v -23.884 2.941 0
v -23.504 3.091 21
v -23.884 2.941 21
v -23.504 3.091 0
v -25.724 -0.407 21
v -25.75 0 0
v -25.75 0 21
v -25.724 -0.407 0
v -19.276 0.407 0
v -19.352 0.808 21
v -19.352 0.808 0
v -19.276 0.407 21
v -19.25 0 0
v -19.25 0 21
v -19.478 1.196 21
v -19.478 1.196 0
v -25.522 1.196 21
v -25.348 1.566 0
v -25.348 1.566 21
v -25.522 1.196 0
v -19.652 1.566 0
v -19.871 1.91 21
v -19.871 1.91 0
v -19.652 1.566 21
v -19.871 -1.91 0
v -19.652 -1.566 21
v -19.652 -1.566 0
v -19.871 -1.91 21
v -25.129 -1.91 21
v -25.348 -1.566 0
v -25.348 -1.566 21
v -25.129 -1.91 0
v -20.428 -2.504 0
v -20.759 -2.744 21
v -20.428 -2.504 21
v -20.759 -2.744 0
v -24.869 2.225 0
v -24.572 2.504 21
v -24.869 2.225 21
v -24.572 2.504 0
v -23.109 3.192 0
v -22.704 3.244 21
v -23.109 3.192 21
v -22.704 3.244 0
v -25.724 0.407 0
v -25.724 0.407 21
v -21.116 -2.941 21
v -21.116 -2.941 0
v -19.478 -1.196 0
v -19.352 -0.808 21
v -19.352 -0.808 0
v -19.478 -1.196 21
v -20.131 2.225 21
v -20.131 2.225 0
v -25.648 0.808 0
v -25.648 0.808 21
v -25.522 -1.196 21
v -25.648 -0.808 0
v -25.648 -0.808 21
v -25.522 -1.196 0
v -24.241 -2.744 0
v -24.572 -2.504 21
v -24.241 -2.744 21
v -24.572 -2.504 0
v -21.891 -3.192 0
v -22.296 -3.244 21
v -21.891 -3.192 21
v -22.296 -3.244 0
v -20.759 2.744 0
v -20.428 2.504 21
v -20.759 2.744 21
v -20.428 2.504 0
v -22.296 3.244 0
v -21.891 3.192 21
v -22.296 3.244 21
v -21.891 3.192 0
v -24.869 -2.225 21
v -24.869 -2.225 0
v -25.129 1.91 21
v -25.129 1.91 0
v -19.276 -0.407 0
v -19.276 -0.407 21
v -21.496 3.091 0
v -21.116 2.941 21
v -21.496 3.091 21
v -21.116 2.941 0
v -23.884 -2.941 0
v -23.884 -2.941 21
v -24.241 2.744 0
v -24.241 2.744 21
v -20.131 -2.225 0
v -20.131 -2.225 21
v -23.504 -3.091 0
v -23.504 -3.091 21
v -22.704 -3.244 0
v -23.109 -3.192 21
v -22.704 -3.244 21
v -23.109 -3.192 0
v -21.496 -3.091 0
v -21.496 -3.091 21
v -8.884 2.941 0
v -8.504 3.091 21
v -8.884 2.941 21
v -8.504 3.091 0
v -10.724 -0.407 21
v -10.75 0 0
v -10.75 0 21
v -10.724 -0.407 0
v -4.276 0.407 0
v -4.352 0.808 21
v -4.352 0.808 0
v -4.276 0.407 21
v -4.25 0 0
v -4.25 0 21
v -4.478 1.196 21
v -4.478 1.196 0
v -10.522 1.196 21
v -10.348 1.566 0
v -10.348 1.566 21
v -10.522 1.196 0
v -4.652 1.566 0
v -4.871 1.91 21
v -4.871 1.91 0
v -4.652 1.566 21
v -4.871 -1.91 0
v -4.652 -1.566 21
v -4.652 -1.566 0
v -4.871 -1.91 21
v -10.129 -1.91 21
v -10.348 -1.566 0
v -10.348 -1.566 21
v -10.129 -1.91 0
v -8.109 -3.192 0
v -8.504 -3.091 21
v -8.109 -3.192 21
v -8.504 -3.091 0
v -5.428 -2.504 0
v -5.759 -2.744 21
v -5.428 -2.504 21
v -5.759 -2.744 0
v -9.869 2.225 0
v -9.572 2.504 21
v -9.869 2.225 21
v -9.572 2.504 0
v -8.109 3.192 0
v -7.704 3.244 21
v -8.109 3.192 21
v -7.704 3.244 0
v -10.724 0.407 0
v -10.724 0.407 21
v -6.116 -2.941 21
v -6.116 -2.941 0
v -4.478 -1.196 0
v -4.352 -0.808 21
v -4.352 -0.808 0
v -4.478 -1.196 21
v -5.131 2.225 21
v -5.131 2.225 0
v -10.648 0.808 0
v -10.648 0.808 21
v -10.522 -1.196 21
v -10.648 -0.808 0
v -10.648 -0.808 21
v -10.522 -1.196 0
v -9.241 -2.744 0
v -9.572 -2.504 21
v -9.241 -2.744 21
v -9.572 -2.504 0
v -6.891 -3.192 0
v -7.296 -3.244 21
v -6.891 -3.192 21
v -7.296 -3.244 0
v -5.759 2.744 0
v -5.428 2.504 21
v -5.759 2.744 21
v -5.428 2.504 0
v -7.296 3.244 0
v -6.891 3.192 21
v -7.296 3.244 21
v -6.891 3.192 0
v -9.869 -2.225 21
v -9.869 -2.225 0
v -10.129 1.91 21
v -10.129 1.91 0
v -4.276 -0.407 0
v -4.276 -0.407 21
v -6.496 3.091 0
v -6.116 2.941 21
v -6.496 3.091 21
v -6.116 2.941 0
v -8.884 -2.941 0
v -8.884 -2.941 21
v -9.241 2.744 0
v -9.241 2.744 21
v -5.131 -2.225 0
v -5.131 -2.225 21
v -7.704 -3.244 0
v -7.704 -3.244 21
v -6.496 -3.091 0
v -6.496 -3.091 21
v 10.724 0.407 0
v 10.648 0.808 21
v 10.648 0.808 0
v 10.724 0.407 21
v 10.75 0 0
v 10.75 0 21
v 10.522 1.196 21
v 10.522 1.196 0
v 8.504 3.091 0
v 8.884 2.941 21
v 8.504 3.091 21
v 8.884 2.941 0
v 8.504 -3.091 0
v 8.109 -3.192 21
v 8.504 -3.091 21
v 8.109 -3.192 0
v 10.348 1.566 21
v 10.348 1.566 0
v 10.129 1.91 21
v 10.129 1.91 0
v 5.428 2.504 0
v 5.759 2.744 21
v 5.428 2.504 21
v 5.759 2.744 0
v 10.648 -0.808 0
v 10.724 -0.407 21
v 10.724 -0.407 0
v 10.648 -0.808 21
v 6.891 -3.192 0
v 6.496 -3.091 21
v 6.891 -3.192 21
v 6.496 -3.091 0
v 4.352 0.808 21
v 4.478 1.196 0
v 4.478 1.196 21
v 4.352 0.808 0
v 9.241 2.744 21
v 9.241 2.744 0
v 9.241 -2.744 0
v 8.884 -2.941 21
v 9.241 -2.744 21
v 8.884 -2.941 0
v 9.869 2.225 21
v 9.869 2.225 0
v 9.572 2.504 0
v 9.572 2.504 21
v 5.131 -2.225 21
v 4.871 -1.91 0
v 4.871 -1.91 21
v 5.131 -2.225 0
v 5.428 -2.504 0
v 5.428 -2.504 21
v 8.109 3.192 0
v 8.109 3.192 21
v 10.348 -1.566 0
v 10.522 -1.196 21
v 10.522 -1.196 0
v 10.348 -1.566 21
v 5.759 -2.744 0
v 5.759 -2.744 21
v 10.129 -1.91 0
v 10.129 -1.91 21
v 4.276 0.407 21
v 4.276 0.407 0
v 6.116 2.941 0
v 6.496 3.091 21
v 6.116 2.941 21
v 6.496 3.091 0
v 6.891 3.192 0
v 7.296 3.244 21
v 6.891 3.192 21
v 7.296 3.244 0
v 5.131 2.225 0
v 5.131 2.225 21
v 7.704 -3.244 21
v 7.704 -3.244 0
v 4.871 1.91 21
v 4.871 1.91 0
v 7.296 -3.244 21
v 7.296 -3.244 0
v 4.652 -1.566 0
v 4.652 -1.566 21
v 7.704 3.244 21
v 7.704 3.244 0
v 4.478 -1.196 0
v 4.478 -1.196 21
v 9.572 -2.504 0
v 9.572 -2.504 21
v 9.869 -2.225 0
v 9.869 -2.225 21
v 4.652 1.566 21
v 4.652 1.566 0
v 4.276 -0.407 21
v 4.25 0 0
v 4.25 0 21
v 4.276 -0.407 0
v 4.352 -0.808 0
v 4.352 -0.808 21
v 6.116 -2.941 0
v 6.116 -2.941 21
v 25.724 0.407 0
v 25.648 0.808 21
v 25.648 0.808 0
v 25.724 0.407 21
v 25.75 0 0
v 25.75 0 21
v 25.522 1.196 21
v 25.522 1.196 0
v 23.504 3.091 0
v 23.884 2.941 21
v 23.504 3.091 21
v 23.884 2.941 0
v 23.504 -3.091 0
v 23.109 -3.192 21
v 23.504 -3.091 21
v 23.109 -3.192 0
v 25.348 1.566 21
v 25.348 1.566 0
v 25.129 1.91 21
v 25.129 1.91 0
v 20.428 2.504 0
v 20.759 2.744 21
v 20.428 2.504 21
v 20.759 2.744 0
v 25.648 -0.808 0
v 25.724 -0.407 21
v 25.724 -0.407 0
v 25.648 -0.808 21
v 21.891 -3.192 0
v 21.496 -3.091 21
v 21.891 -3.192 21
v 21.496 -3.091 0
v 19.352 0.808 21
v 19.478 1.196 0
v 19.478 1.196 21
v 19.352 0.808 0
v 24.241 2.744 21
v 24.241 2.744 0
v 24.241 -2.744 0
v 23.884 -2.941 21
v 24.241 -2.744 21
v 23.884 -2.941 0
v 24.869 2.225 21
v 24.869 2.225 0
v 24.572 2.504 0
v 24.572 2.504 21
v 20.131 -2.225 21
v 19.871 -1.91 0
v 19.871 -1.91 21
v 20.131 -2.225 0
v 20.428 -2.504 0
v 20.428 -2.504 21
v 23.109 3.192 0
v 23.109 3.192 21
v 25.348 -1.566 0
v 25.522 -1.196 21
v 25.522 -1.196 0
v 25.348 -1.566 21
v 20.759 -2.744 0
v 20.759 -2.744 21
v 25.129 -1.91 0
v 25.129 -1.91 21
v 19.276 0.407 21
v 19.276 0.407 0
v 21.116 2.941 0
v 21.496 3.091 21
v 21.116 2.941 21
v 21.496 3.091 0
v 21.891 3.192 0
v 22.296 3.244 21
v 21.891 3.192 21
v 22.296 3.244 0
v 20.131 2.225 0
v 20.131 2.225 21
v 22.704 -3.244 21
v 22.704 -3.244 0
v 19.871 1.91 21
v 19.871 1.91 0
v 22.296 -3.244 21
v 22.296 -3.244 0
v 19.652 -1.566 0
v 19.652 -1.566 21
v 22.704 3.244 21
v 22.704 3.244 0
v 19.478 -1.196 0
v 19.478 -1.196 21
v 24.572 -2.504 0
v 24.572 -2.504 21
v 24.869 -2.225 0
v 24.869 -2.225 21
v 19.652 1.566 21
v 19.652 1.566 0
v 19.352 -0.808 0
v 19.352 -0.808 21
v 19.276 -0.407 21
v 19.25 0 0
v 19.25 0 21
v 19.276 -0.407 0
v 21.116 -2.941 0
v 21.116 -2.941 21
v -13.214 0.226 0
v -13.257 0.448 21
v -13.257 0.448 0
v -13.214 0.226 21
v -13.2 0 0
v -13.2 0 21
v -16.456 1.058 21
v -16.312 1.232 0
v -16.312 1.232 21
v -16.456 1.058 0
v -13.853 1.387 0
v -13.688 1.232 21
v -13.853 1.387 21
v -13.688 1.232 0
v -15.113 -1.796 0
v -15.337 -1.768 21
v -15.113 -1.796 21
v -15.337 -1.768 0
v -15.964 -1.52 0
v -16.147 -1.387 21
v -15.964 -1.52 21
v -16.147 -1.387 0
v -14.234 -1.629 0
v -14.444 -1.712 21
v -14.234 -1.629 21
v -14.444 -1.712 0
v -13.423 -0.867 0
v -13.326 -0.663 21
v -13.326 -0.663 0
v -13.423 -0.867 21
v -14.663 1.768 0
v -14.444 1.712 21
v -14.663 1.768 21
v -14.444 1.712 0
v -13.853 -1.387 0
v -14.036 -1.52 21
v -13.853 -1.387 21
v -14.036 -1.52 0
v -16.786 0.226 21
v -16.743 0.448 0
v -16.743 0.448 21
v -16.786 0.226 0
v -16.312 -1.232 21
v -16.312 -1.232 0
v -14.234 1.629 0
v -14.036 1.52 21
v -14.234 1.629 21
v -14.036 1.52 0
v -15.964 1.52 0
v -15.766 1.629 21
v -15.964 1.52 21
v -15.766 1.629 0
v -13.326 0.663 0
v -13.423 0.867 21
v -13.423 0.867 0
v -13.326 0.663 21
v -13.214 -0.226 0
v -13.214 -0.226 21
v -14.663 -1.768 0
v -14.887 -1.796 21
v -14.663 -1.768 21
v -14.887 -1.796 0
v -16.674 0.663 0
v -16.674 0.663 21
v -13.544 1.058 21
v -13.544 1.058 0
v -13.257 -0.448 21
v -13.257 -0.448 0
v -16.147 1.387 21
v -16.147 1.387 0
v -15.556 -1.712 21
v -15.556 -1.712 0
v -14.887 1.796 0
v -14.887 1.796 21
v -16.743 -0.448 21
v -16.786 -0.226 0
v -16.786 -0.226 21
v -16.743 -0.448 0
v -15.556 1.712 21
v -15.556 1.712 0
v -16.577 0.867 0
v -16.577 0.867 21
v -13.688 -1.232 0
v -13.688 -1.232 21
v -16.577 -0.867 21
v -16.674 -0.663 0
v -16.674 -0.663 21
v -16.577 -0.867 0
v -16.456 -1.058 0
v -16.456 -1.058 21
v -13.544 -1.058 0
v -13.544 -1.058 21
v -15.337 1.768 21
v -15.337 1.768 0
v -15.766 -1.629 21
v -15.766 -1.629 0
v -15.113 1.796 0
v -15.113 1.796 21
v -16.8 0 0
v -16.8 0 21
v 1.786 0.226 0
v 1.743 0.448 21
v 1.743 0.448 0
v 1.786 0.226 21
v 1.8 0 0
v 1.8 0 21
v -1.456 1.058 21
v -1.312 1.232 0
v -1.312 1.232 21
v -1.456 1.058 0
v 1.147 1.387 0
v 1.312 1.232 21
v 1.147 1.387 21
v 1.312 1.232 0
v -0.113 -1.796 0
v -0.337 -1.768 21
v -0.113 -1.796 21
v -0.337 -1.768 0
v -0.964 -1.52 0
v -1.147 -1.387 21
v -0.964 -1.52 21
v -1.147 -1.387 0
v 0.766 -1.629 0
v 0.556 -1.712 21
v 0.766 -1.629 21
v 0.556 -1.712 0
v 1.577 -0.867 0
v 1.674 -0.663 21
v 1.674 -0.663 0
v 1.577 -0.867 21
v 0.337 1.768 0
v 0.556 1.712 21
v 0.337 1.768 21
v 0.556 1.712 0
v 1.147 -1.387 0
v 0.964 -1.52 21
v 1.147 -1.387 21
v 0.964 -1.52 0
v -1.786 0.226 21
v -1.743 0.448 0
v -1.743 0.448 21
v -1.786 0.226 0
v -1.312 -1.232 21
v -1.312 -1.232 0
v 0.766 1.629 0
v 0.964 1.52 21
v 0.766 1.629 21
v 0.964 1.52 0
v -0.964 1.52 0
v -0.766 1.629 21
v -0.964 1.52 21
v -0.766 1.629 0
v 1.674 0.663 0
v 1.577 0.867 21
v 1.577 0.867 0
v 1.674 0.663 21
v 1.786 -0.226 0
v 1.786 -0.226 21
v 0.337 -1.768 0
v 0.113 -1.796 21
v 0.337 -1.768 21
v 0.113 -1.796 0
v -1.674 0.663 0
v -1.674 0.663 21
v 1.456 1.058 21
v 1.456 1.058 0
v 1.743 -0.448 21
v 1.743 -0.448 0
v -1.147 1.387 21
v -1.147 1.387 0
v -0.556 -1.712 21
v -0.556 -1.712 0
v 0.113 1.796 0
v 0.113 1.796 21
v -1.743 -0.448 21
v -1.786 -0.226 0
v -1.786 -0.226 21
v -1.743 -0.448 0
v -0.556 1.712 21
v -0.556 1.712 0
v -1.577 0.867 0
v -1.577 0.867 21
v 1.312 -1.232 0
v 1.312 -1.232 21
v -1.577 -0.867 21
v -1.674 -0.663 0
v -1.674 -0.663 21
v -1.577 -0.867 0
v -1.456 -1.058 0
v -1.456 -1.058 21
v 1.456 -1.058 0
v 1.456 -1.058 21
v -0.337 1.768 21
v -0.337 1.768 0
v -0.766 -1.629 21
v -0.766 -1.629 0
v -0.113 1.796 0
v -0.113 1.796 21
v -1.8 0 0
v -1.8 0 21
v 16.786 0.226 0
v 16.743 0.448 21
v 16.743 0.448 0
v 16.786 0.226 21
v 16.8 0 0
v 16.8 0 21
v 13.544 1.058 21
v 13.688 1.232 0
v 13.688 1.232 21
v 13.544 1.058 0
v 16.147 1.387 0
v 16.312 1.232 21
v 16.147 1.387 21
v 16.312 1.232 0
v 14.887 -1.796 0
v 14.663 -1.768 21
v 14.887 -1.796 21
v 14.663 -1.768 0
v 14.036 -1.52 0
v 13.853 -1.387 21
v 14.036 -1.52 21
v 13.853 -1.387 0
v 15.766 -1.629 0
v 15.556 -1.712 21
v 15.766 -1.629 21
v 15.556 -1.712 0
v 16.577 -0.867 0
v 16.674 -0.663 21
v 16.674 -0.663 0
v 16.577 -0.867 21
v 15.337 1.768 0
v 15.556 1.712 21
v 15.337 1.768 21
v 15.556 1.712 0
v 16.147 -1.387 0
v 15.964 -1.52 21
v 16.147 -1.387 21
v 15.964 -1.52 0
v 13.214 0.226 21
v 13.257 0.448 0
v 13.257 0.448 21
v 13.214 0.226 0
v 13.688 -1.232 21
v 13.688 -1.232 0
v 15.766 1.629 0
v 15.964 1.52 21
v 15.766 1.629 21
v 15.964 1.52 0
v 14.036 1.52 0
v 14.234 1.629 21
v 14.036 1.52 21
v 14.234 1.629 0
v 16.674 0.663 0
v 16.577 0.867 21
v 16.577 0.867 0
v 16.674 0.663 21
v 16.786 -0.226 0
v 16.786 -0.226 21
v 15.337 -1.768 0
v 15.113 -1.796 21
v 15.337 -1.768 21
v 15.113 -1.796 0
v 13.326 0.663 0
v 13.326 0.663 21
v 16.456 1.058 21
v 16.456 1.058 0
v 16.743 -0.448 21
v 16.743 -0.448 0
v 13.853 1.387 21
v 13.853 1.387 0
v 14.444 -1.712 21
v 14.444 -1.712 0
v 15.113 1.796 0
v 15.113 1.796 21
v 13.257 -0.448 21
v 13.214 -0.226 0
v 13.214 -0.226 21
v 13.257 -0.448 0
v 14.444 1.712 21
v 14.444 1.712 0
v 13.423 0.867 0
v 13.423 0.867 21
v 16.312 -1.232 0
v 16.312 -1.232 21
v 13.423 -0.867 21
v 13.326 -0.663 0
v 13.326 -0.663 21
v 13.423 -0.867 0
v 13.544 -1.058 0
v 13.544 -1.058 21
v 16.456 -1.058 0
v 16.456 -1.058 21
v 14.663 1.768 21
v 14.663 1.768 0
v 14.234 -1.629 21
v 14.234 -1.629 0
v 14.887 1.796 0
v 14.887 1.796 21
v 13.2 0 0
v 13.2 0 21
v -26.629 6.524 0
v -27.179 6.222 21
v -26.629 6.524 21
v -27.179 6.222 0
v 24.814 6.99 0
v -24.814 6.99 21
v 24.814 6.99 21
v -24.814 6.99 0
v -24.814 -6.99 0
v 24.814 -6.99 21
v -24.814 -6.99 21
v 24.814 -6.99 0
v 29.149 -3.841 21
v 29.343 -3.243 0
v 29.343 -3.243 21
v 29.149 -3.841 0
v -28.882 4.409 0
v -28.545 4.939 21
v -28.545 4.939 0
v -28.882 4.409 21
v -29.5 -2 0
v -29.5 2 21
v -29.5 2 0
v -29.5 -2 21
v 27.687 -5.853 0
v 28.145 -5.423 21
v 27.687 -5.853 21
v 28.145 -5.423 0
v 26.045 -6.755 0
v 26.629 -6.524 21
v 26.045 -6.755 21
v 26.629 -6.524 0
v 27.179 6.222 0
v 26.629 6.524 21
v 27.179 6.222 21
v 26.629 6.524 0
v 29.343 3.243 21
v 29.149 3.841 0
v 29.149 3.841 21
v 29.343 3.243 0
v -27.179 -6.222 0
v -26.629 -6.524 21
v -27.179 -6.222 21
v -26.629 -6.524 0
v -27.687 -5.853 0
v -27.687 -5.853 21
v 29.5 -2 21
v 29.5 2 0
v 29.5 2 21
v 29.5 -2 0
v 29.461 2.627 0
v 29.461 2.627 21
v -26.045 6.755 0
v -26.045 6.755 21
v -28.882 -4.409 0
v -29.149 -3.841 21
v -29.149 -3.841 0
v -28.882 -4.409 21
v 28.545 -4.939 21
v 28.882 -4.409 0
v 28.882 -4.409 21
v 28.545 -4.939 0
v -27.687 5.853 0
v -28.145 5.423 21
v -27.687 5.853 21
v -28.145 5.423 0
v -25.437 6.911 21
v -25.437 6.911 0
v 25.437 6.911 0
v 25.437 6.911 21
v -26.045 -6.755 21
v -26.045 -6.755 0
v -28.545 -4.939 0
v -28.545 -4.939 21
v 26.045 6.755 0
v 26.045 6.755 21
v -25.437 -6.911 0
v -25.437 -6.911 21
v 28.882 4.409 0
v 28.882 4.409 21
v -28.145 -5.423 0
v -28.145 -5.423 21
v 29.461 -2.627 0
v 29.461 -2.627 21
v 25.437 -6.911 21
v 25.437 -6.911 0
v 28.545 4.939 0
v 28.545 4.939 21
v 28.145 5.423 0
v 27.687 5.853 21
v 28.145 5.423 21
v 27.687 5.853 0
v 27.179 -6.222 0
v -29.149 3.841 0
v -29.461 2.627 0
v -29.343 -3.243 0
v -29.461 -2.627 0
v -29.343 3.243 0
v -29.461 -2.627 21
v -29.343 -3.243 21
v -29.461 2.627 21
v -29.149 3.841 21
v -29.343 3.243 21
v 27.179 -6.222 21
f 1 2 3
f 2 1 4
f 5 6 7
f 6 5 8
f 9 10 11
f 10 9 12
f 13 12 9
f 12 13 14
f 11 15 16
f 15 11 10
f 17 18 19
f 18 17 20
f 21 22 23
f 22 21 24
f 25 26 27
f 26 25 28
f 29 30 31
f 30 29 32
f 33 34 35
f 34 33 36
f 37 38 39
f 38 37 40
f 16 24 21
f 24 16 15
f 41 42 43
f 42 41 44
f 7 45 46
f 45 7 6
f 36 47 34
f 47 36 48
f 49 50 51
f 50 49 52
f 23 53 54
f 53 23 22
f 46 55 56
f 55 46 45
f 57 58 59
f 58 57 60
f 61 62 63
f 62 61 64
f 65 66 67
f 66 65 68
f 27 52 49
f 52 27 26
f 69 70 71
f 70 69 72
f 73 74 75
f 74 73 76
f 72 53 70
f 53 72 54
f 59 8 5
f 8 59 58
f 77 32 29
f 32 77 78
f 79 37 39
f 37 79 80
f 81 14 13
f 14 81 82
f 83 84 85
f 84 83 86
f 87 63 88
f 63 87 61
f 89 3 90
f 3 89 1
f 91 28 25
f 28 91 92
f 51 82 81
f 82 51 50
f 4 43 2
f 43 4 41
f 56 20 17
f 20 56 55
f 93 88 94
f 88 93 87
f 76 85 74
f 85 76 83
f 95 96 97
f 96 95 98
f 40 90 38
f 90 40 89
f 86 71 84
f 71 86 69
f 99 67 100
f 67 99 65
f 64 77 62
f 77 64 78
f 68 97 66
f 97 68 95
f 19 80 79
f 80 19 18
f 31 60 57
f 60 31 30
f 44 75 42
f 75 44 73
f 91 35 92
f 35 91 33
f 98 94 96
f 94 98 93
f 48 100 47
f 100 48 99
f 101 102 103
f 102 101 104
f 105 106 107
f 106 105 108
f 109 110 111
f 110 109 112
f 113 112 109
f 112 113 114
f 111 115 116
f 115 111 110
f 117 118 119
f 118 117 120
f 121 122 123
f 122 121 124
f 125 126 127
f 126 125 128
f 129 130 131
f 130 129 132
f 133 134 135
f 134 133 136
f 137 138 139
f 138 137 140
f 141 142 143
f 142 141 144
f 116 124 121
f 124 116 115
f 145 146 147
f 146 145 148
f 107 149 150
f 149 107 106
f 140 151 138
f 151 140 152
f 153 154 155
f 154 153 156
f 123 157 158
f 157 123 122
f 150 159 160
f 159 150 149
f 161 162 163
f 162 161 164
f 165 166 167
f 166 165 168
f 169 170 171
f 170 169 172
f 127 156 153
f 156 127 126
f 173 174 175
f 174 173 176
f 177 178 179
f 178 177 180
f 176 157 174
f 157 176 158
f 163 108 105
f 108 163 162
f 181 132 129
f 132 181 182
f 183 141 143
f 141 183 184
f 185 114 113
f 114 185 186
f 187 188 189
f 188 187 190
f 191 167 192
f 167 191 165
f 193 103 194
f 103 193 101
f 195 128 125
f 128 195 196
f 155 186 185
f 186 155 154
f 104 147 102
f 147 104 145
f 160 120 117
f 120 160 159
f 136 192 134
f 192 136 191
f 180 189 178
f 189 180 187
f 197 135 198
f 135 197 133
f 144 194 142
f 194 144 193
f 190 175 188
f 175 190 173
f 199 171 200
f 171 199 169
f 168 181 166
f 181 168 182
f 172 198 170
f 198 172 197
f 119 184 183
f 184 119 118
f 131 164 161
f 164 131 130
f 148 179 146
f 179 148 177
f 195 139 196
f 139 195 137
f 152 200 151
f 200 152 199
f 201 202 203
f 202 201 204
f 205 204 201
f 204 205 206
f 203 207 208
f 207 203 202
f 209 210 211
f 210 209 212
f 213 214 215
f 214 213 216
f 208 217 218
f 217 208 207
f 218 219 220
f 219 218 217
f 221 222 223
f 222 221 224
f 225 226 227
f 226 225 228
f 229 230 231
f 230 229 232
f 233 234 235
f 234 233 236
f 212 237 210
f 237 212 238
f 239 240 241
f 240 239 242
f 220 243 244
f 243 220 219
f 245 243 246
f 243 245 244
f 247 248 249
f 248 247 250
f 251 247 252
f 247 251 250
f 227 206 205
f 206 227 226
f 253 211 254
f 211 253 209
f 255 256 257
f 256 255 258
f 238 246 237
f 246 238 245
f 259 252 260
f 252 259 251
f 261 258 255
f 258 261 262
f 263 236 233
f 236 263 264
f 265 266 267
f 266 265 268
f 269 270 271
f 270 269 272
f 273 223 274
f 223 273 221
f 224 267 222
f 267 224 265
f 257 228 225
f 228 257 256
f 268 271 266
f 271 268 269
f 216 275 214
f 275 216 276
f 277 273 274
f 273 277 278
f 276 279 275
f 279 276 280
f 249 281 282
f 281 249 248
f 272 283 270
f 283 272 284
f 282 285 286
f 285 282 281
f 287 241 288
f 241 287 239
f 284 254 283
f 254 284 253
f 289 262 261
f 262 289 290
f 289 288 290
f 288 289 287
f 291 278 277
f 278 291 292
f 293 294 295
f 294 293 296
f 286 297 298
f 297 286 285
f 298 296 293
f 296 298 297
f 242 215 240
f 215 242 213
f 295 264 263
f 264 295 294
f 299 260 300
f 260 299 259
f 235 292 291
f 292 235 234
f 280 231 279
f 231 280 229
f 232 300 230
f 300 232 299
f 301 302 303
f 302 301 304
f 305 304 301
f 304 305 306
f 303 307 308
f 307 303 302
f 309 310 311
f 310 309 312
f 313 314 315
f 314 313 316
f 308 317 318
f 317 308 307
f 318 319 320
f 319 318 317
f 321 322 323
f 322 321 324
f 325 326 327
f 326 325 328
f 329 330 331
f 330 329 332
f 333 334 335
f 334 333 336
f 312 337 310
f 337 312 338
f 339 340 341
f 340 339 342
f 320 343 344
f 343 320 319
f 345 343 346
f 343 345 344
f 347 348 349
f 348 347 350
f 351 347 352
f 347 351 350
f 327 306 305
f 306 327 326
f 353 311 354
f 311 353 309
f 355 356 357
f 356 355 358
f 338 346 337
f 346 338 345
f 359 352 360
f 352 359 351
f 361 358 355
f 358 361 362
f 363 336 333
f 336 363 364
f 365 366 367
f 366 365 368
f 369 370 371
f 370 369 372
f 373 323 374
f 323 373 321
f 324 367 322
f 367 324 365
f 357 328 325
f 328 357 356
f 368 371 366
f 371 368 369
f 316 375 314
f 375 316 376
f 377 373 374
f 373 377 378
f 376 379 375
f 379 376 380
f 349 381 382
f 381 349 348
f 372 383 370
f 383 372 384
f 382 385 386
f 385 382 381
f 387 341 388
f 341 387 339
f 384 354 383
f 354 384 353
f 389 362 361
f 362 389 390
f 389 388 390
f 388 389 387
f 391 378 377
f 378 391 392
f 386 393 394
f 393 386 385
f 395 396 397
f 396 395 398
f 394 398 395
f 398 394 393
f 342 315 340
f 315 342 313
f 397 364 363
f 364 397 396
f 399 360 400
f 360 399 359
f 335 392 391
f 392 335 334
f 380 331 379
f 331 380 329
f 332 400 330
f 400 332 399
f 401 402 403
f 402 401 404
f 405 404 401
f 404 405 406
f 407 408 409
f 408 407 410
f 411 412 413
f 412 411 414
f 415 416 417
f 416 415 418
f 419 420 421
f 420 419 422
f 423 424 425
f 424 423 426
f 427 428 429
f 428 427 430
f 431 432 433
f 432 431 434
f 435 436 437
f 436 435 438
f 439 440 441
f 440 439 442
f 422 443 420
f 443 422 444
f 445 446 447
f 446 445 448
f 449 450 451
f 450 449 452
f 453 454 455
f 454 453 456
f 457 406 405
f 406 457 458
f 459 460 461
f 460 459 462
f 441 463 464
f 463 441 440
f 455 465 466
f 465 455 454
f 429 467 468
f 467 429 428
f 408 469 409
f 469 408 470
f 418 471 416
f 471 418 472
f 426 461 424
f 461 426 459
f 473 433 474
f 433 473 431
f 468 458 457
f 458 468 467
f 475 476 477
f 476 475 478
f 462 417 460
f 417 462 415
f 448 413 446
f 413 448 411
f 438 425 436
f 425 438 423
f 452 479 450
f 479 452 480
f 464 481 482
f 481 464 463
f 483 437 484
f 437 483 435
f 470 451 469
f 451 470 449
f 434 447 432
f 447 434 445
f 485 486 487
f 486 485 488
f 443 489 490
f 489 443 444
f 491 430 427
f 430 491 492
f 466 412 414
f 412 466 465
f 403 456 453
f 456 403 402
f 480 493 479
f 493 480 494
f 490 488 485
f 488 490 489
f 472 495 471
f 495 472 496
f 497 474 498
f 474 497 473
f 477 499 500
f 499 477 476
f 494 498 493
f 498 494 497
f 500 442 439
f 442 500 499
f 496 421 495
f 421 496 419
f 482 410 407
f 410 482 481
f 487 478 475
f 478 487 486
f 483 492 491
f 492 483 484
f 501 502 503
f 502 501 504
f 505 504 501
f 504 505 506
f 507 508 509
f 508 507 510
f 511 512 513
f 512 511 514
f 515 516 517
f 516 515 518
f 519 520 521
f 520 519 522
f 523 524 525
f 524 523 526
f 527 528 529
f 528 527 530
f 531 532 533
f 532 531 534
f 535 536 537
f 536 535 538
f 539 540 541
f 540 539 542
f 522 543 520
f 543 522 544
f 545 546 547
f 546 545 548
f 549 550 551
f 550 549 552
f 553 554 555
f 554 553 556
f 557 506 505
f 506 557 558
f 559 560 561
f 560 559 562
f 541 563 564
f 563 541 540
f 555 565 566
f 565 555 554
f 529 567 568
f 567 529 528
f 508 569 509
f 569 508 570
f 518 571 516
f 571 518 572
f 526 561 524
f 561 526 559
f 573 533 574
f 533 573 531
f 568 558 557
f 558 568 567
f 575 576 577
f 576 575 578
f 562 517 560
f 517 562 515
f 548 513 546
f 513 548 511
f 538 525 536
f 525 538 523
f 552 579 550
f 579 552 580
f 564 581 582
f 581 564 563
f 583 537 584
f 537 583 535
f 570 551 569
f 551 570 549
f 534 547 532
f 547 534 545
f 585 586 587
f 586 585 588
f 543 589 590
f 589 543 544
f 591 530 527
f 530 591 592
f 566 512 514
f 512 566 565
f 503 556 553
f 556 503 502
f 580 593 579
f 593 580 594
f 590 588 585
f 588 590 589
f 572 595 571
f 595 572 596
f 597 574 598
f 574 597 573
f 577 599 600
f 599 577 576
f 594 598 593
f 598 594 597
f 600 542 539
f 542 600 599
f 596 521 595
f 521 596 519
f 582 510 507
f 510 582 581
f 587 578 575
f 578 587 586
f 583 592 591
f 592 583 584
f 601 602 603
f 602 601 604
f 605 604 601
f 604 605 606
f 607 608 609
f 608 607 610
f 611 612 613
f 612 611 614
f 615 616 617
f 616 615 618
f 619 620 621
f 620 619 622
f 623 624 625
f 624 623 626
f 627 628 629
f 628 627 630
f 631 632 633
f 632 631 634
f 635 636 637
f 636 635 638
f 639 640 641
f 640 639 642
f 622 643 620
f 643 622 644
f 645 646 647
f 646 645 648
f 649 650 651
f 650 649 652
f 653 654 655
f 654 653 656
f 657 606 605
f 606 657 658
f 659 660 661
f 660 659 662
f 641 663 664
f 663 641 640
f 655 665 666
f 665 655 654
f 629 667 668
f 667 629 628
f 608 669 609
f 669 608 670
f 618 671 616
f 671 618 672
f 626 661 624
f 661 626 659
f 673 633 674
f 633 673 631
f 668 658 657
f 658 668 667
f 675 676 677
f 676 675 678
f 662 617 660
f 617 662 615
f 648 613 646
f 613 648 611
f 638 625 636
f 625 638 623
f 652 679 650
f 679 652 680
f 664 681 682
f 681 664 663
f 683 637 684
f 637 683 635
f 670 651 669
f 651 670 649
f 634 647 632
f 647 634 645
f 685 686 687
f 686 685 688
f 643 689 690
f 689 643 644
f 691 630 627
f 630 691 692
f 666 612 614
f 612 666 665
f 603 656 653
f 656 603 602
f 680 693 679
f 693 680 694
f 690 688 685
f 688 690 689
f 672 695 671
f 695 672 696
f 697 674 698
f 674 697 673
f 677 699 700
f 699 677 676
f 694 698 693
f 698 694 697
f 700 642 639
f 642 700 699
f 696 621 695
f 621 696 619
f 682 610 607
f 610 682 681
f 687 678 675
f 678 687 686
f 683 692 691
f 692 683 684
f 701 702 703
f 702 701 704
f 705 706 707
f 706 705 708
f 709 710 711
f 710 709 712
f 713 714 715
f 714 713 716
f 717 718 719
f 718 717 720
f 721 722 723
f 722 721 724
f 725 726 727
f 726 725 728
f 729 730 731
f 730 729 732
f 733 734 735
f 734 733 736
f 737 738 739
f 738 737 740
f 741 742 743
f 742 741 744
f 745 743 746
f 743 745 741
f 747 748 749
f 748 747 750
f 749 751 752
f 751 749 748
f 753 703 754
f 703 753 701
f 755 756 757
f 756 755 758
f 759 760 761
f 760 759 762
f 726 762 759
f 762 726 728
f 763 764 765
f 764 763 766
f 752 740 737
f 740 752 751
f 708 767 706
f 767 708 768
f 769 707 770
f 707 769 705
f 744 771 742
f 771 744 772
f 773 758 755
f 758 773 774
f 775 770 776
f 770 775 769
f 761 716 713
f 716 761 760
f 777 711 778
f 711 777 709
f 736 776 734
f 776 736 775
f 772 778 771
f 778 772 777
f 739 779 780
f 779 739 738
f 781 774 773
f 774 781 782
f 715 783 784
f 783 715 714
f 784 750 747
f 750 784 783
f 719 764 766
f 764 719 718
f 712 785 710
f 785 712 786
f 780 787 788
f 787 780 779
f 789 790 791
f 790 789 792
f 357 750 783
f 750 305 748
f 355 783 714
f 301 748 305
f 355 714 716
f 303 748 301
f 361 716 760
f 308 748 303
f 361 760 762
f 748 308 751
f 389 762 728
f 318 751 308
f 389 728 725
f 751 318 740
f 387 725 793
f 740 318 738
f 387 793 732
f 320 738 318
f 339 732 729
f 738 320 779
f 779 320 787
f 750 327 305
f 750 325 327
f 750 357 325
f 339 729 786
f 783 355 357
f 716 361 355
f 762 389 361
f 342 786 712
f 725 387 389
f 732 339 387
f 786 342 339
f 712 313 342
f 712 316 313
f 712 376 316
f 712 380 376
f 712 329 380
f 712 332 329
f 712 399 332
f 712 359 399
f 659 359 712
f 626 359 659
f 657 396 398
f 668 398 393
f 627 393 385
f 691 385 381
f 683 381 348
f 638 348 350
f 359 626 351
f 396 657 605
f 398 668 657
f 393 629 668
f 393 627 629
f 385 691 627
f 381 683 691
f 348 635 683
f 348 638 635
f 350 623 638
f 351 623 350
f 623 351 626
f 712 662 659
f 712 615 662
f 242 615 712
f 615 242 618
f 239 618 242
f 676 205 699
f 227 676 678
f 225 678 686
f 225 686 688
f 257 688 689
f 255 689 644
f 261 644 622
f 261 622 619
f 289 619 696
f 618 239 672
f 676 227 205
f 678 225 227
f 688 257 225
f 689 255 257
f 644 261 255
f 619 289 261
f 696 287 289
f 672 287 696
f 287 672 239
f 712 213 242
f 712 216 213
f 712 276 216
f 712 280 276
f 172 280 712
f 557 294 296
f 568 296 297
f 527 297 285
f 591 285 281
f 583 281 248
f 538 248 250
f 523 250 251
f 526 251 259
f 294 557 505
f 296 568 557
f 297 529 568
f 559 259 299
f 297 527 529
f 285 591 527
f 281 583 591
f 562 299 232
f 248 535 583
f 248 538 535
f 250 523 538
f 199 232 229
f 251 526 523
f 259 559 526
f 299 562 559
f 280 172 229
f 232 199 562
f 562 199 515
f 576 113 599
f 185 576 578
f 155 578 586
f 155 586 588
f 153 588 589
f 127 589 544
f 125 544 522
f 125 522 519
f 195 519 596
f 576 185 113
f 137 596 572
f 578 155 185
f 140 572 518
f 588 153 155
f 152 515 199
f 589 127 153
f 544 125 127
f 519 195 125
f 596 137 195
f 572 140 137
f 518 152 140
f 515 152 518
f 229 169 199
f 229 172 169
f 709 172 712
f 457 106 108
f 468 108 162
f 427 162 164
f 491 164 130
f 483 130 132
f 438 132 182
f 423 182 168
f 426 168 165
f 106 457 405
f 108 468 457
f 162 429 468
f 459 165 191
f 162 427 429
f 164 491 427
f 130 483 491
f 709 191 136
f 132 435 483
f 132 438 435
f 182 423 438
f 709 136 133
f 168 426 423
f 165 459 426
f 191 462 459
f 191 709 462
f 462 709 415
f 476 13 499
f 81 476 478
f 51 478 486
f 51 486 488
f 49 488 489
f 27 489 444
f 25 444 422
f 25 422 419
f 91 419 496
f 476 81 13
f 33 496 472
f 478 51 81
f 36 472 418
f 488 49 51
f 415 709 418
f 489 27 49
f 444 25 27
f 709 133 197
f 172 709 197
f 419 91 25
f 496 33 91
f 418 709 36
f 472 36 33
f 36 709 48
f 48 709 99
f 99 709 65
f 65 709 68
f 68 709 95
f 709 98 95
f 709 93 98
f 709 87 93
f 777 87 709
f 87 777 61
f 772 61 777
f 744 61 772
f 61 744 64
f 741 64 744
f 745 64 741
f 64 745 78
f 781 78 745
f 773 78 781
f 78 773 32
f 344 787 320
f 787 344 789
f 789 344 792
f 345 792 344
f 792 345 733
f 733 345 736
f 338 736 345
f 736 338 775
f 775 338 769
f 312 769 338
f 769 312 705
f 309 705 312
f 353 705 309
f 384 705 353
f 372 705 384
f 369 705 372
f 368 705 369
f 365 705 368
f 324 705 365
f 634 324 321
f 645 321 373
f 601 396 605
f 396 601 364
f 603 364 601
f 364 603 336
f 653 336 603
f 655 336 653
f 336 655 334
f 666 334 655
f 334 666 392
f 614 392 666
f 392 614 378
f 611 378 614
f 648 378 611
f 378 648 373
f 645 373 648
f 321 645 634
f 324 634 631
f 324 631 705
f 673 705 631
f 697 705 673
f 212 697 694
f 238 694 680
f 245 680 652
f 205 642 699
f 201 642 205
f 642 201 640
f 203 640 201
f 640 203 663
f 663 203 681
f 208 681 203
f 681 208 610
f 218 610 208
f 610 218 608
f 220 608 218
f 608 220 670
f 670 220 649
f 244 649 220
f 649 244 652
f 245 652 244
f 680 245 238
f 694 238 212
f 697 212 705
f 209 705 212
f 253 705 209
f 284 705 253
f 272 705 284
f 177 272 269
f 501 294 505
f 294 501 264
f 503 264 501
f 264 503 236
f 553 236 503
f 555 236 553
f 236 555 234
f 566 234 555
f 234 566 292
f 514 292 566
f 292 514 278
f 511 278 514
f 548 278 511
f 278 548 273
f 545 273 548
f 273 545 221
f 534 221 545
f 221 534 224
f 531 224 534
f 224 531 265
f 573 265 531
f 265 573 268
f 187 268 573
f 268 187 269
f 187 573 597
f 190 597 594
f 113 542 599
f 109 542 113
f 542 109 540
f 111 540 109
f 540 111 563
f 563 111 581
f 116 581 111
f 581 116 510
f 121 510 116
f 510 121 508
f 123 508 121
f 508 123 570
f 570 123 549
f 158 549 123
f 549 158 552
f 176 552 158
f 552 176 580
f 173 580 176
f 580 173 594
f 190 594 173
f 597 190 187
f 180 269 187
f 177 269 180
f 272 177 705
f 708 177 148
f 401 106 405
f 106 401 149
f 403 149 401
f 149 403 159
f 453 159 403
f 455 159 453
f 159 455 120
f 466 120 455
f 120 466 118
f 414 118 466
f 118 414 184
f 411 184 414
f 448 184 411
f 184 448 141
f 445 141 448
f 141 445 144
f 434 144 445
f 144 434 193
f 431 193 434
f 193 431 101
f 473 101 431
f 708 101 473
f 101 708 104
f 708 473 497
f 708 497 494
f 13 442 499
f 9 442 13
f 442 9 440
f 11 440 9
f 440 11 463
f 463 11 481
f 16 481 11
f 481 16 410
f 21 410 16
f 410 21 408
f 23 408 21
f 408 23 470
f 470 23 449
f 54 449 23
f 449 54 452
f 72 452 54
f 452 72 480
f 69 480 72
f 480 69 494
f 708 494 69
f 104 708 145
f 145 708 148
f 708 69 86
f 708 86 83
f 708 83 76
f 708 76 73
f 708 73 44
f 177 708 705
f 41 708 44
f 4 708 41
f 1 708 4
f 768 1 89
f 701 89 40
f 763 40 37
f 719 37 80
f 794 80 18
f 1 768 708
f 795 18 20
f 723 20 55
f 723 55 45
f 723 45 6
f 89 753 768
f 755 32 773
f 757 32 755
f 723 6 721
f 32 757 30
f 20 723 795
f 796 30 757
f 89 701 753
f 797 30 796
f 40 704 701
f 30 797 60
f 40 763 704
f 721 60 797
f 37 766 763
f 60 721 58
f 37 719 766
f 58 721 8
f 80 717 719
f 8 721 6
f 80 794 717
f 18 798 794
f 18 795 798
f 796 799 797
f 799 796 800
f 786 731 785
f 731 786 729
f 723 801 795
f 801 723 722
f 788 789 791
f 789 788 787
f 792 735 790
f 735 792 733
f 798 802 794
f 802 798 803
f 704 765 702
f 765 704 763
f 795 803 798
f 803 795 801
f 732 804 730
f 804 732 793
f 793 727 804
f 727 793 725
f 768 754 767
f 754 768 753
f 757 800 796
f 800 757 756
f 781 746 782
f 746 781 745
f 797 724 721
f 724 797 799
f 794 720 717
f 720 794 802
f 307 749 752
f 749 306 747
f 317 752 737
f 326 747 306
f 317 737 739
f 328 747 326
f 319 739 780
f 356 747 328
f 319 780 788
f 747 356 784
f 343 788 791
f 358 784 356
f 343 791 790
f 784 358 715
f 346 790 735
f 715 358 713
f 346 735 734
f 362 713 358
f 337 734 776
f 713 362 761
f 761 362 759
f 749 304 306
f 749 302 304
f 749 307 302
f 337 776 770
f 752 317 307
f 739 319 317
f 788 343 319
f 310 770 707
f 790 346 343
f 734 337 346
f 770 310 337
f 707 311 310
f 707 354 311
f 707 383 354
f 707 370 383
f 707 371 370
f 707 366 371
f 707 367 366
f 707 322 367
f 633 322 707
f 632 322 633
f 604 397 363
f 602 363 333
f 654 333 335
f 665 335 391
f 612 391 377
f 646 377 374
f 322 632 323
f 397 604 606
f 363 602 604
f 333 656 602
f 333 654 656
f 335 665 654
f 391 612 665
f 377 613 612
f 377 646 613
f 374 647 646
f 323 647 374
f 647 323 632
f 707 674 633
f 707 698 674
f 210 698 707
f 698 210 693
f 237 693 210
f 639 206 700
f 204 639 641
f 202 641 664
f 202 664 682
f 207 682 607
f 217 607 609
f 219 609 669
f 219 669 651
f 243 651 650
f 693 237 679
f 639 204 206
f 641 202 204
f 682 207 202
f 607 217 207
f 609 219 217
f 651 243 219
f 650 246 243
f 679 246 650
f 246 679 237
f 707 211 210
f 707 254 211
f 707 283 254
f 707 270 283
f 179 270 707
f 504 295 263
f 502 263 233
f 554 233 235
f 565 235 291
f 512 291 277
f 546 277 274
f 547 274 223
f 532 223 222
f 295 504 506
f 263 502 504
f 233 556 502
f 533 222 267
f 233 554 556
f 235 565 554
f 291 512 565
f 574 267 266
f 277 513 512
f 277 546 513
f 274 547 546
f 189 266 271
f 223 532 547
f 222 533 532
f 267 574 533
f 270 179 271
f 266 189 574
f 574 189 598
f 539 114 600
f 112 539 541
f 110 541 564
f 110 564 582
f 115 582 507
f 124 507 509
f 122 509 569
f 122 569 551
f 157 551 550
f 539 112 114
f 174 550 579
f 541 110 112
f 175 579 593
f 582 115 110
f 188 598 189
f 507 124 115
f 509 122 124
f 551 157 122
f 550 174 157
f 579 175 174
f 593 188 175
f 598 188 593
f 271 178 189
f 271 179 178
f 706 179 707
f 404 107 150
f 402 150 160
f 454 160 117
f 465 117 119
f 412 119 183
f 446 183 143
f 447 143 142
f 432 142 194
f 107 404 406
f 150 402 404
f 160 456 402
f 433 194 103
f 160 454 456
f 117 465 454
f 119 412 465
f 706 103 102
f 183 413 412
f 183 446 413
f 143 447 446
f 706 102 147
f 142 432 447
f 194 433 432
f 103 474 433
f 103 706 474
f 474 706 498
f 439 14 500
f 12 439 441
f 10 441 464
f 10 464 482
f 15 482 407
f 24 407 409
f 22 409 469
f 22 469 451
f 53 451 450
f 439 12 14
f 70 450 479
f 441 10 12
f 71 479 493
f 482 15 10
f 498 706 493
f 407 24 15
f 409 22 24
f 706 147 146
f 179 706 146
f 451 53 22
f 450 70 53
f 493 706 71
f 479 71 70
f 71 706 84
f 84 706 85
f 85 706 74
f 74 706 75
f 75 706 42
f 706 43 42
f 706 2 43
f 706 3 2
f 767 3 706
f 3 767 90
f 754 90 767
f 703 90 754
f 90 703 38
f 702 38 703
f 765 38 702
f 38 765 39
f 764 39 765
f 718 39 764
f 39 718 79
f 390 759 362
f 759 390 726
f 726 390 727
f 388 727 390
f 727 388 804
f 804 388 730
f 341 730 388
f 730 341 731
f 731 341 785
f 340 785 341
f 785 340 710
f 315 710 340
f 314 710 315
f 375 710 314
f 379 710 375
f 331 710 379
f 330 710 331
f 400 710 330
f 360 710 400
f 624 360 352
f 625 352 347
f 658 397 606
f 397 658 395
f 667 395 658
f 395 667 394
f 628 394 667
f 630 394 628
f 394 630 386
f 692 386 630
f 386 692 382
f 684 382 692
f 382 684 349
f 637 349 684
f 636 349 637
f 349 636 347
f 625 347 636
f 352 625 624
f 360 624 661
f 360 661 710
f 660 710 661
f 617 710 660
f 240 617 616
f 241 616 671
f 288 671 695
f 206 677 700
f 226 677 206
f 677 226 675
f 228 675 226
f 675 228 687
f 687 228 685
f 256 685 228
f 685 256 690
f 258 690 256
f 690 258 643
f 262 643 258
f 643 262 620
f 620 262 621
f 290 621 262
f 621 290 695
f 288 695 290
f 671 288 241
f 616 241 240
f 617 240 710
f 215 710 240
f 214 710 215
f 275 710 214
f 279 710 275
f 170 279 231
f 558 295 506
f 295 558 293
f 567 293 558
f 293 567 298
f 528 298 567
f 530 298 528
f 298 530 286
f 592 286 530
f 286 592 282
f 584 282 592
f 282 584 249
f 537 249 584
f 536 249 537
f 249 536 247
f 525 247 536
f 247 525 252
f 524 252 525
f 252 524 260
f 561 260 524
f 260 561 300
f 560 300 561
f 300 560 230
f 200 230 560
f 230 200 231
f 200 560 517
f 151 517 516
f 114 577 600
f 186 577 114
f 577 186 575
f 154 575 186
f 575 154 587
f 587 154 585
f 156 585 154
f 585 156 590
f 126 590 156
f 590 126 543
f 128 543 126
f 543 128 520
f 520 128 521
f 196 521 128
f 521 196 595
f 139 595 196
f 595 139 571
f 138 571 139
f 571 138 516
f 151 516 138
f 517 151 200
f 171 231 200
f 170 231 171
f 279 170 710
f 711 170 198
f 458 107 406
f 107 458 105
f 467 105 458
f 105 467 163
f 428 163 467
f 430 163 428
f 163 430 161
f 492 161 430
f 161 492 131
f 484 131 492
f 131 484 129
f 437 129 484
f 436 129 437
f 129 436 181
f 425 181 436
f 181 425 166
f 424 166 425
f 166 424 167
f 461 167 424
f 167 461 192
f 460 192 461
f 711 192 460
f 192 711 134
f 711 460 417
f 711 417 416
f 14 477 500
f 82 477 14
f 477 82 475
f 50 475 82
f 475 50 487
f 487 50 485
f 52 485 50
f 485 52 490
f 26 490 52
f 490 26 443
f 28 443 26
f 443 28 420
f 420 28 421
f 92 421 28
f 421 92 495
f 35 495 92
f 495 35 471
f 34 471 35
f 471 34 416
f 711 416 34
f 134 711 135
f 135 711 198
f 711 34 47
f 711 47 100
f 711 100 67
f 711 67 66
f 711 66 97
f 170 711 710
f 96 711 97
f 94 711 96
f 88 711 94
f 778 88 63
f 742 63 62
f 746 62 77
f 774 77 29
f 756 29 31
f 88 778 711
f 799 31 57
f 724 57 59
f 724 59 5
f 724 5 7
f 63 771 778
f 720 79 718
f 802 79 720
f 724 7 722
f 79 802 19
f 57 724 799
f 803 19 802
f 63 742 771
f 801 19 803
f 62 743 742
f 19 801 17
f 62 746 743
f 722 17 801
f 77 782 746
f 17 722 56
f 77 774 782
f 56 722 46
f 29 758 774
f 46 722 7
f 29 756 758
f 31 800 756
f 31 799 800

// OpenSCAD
$fn = 50;


difference() {
	union() {
		hull() {
			translate(v = [-24.5000000000, 2.0000000000, 0]) {
				cylinder(h = 21, r = 5);
			}
			translate(v = [24.5000000000, 2.0000000000, 0]) {
				cylinder(h = 21, r = 5);
			}
			translate(v = [-24.5000000000, -2.0000000000, 0]) {
				cylinder(h = 21, r = 5);
			}
			translate(v = [24.5000000000, -2.0000000000, 0]) {
				cylinder(h = 21, r = 5);
			}
		}
	}
	union() {
		translate(v = [-22.5000000000, 0.0000000000, 0]) {
			translate(v = [0, 0, -100]) {
				cylinder(h = 200, r = 3.2500000000);
			}
		}
		translate(v = [-7.5000000000, 0.0000000000, 0]) {
			translate(v = [0, 0, -100]) {
				cylinder(h = 200, r = 3.2500000000);
			}
		}
		translate(v = [7.5000000000, 0.0000000000, 0]) {
			translate(v = [0, 0, -100]) {
				cylinder(h = 200, r = 3.2500000000);
			}
		}
		translate(v = [22.5000000000, 0.0000000000, 0]) {
			translate(v = [0, 0, -100]) {
				cylinder(h = 200, r = 3.2500000000);
			}
		}
		translate(v = [-22.5000000000, 0.0000000000, 0]) {
			translate(v = [0, 0, -100]) {
				cylinder(h = 200, r = 1.8000000000);
			}
		}
		translate(v = [-15.0000000000, 0.0000000000, 0]) {
			translate(v = [0, 0, -100]) {
				cylinder(h = 200, r = 1.8000000000);
			}
		}
		translate(v = [-7.5000000000, 0.0000000000, 0]) {
			translate(v = [0, 0, -100]) {
				cylinder(h = 200, r = 1.8000000000);
			}
		}
		translate(v = [0, 0, -100]) {
			cylinder(h = 200, r = 1.8000000000);
		}
		translate(v = [7.5000000000, 0.0000000000, 0]) {
			translate(v = [0, 0, -100]) {
				cylinder(h = 200, r = 1.8000000000);
			}
		}
		translate(v = [15.0000000000, 0.0000000000, 0]) {
			translate(v = [0, 0, -100]) {
				cylinder(h = 200, r = 1.8000000000);
			}
		}
		translate(v = [22.5000000000, 0.0000000000, 0]) {
			translate(v = [0, 0, -100]) {
				cylinder(h = 200, r = 1.8000000000);
			}
		}
	}
}
